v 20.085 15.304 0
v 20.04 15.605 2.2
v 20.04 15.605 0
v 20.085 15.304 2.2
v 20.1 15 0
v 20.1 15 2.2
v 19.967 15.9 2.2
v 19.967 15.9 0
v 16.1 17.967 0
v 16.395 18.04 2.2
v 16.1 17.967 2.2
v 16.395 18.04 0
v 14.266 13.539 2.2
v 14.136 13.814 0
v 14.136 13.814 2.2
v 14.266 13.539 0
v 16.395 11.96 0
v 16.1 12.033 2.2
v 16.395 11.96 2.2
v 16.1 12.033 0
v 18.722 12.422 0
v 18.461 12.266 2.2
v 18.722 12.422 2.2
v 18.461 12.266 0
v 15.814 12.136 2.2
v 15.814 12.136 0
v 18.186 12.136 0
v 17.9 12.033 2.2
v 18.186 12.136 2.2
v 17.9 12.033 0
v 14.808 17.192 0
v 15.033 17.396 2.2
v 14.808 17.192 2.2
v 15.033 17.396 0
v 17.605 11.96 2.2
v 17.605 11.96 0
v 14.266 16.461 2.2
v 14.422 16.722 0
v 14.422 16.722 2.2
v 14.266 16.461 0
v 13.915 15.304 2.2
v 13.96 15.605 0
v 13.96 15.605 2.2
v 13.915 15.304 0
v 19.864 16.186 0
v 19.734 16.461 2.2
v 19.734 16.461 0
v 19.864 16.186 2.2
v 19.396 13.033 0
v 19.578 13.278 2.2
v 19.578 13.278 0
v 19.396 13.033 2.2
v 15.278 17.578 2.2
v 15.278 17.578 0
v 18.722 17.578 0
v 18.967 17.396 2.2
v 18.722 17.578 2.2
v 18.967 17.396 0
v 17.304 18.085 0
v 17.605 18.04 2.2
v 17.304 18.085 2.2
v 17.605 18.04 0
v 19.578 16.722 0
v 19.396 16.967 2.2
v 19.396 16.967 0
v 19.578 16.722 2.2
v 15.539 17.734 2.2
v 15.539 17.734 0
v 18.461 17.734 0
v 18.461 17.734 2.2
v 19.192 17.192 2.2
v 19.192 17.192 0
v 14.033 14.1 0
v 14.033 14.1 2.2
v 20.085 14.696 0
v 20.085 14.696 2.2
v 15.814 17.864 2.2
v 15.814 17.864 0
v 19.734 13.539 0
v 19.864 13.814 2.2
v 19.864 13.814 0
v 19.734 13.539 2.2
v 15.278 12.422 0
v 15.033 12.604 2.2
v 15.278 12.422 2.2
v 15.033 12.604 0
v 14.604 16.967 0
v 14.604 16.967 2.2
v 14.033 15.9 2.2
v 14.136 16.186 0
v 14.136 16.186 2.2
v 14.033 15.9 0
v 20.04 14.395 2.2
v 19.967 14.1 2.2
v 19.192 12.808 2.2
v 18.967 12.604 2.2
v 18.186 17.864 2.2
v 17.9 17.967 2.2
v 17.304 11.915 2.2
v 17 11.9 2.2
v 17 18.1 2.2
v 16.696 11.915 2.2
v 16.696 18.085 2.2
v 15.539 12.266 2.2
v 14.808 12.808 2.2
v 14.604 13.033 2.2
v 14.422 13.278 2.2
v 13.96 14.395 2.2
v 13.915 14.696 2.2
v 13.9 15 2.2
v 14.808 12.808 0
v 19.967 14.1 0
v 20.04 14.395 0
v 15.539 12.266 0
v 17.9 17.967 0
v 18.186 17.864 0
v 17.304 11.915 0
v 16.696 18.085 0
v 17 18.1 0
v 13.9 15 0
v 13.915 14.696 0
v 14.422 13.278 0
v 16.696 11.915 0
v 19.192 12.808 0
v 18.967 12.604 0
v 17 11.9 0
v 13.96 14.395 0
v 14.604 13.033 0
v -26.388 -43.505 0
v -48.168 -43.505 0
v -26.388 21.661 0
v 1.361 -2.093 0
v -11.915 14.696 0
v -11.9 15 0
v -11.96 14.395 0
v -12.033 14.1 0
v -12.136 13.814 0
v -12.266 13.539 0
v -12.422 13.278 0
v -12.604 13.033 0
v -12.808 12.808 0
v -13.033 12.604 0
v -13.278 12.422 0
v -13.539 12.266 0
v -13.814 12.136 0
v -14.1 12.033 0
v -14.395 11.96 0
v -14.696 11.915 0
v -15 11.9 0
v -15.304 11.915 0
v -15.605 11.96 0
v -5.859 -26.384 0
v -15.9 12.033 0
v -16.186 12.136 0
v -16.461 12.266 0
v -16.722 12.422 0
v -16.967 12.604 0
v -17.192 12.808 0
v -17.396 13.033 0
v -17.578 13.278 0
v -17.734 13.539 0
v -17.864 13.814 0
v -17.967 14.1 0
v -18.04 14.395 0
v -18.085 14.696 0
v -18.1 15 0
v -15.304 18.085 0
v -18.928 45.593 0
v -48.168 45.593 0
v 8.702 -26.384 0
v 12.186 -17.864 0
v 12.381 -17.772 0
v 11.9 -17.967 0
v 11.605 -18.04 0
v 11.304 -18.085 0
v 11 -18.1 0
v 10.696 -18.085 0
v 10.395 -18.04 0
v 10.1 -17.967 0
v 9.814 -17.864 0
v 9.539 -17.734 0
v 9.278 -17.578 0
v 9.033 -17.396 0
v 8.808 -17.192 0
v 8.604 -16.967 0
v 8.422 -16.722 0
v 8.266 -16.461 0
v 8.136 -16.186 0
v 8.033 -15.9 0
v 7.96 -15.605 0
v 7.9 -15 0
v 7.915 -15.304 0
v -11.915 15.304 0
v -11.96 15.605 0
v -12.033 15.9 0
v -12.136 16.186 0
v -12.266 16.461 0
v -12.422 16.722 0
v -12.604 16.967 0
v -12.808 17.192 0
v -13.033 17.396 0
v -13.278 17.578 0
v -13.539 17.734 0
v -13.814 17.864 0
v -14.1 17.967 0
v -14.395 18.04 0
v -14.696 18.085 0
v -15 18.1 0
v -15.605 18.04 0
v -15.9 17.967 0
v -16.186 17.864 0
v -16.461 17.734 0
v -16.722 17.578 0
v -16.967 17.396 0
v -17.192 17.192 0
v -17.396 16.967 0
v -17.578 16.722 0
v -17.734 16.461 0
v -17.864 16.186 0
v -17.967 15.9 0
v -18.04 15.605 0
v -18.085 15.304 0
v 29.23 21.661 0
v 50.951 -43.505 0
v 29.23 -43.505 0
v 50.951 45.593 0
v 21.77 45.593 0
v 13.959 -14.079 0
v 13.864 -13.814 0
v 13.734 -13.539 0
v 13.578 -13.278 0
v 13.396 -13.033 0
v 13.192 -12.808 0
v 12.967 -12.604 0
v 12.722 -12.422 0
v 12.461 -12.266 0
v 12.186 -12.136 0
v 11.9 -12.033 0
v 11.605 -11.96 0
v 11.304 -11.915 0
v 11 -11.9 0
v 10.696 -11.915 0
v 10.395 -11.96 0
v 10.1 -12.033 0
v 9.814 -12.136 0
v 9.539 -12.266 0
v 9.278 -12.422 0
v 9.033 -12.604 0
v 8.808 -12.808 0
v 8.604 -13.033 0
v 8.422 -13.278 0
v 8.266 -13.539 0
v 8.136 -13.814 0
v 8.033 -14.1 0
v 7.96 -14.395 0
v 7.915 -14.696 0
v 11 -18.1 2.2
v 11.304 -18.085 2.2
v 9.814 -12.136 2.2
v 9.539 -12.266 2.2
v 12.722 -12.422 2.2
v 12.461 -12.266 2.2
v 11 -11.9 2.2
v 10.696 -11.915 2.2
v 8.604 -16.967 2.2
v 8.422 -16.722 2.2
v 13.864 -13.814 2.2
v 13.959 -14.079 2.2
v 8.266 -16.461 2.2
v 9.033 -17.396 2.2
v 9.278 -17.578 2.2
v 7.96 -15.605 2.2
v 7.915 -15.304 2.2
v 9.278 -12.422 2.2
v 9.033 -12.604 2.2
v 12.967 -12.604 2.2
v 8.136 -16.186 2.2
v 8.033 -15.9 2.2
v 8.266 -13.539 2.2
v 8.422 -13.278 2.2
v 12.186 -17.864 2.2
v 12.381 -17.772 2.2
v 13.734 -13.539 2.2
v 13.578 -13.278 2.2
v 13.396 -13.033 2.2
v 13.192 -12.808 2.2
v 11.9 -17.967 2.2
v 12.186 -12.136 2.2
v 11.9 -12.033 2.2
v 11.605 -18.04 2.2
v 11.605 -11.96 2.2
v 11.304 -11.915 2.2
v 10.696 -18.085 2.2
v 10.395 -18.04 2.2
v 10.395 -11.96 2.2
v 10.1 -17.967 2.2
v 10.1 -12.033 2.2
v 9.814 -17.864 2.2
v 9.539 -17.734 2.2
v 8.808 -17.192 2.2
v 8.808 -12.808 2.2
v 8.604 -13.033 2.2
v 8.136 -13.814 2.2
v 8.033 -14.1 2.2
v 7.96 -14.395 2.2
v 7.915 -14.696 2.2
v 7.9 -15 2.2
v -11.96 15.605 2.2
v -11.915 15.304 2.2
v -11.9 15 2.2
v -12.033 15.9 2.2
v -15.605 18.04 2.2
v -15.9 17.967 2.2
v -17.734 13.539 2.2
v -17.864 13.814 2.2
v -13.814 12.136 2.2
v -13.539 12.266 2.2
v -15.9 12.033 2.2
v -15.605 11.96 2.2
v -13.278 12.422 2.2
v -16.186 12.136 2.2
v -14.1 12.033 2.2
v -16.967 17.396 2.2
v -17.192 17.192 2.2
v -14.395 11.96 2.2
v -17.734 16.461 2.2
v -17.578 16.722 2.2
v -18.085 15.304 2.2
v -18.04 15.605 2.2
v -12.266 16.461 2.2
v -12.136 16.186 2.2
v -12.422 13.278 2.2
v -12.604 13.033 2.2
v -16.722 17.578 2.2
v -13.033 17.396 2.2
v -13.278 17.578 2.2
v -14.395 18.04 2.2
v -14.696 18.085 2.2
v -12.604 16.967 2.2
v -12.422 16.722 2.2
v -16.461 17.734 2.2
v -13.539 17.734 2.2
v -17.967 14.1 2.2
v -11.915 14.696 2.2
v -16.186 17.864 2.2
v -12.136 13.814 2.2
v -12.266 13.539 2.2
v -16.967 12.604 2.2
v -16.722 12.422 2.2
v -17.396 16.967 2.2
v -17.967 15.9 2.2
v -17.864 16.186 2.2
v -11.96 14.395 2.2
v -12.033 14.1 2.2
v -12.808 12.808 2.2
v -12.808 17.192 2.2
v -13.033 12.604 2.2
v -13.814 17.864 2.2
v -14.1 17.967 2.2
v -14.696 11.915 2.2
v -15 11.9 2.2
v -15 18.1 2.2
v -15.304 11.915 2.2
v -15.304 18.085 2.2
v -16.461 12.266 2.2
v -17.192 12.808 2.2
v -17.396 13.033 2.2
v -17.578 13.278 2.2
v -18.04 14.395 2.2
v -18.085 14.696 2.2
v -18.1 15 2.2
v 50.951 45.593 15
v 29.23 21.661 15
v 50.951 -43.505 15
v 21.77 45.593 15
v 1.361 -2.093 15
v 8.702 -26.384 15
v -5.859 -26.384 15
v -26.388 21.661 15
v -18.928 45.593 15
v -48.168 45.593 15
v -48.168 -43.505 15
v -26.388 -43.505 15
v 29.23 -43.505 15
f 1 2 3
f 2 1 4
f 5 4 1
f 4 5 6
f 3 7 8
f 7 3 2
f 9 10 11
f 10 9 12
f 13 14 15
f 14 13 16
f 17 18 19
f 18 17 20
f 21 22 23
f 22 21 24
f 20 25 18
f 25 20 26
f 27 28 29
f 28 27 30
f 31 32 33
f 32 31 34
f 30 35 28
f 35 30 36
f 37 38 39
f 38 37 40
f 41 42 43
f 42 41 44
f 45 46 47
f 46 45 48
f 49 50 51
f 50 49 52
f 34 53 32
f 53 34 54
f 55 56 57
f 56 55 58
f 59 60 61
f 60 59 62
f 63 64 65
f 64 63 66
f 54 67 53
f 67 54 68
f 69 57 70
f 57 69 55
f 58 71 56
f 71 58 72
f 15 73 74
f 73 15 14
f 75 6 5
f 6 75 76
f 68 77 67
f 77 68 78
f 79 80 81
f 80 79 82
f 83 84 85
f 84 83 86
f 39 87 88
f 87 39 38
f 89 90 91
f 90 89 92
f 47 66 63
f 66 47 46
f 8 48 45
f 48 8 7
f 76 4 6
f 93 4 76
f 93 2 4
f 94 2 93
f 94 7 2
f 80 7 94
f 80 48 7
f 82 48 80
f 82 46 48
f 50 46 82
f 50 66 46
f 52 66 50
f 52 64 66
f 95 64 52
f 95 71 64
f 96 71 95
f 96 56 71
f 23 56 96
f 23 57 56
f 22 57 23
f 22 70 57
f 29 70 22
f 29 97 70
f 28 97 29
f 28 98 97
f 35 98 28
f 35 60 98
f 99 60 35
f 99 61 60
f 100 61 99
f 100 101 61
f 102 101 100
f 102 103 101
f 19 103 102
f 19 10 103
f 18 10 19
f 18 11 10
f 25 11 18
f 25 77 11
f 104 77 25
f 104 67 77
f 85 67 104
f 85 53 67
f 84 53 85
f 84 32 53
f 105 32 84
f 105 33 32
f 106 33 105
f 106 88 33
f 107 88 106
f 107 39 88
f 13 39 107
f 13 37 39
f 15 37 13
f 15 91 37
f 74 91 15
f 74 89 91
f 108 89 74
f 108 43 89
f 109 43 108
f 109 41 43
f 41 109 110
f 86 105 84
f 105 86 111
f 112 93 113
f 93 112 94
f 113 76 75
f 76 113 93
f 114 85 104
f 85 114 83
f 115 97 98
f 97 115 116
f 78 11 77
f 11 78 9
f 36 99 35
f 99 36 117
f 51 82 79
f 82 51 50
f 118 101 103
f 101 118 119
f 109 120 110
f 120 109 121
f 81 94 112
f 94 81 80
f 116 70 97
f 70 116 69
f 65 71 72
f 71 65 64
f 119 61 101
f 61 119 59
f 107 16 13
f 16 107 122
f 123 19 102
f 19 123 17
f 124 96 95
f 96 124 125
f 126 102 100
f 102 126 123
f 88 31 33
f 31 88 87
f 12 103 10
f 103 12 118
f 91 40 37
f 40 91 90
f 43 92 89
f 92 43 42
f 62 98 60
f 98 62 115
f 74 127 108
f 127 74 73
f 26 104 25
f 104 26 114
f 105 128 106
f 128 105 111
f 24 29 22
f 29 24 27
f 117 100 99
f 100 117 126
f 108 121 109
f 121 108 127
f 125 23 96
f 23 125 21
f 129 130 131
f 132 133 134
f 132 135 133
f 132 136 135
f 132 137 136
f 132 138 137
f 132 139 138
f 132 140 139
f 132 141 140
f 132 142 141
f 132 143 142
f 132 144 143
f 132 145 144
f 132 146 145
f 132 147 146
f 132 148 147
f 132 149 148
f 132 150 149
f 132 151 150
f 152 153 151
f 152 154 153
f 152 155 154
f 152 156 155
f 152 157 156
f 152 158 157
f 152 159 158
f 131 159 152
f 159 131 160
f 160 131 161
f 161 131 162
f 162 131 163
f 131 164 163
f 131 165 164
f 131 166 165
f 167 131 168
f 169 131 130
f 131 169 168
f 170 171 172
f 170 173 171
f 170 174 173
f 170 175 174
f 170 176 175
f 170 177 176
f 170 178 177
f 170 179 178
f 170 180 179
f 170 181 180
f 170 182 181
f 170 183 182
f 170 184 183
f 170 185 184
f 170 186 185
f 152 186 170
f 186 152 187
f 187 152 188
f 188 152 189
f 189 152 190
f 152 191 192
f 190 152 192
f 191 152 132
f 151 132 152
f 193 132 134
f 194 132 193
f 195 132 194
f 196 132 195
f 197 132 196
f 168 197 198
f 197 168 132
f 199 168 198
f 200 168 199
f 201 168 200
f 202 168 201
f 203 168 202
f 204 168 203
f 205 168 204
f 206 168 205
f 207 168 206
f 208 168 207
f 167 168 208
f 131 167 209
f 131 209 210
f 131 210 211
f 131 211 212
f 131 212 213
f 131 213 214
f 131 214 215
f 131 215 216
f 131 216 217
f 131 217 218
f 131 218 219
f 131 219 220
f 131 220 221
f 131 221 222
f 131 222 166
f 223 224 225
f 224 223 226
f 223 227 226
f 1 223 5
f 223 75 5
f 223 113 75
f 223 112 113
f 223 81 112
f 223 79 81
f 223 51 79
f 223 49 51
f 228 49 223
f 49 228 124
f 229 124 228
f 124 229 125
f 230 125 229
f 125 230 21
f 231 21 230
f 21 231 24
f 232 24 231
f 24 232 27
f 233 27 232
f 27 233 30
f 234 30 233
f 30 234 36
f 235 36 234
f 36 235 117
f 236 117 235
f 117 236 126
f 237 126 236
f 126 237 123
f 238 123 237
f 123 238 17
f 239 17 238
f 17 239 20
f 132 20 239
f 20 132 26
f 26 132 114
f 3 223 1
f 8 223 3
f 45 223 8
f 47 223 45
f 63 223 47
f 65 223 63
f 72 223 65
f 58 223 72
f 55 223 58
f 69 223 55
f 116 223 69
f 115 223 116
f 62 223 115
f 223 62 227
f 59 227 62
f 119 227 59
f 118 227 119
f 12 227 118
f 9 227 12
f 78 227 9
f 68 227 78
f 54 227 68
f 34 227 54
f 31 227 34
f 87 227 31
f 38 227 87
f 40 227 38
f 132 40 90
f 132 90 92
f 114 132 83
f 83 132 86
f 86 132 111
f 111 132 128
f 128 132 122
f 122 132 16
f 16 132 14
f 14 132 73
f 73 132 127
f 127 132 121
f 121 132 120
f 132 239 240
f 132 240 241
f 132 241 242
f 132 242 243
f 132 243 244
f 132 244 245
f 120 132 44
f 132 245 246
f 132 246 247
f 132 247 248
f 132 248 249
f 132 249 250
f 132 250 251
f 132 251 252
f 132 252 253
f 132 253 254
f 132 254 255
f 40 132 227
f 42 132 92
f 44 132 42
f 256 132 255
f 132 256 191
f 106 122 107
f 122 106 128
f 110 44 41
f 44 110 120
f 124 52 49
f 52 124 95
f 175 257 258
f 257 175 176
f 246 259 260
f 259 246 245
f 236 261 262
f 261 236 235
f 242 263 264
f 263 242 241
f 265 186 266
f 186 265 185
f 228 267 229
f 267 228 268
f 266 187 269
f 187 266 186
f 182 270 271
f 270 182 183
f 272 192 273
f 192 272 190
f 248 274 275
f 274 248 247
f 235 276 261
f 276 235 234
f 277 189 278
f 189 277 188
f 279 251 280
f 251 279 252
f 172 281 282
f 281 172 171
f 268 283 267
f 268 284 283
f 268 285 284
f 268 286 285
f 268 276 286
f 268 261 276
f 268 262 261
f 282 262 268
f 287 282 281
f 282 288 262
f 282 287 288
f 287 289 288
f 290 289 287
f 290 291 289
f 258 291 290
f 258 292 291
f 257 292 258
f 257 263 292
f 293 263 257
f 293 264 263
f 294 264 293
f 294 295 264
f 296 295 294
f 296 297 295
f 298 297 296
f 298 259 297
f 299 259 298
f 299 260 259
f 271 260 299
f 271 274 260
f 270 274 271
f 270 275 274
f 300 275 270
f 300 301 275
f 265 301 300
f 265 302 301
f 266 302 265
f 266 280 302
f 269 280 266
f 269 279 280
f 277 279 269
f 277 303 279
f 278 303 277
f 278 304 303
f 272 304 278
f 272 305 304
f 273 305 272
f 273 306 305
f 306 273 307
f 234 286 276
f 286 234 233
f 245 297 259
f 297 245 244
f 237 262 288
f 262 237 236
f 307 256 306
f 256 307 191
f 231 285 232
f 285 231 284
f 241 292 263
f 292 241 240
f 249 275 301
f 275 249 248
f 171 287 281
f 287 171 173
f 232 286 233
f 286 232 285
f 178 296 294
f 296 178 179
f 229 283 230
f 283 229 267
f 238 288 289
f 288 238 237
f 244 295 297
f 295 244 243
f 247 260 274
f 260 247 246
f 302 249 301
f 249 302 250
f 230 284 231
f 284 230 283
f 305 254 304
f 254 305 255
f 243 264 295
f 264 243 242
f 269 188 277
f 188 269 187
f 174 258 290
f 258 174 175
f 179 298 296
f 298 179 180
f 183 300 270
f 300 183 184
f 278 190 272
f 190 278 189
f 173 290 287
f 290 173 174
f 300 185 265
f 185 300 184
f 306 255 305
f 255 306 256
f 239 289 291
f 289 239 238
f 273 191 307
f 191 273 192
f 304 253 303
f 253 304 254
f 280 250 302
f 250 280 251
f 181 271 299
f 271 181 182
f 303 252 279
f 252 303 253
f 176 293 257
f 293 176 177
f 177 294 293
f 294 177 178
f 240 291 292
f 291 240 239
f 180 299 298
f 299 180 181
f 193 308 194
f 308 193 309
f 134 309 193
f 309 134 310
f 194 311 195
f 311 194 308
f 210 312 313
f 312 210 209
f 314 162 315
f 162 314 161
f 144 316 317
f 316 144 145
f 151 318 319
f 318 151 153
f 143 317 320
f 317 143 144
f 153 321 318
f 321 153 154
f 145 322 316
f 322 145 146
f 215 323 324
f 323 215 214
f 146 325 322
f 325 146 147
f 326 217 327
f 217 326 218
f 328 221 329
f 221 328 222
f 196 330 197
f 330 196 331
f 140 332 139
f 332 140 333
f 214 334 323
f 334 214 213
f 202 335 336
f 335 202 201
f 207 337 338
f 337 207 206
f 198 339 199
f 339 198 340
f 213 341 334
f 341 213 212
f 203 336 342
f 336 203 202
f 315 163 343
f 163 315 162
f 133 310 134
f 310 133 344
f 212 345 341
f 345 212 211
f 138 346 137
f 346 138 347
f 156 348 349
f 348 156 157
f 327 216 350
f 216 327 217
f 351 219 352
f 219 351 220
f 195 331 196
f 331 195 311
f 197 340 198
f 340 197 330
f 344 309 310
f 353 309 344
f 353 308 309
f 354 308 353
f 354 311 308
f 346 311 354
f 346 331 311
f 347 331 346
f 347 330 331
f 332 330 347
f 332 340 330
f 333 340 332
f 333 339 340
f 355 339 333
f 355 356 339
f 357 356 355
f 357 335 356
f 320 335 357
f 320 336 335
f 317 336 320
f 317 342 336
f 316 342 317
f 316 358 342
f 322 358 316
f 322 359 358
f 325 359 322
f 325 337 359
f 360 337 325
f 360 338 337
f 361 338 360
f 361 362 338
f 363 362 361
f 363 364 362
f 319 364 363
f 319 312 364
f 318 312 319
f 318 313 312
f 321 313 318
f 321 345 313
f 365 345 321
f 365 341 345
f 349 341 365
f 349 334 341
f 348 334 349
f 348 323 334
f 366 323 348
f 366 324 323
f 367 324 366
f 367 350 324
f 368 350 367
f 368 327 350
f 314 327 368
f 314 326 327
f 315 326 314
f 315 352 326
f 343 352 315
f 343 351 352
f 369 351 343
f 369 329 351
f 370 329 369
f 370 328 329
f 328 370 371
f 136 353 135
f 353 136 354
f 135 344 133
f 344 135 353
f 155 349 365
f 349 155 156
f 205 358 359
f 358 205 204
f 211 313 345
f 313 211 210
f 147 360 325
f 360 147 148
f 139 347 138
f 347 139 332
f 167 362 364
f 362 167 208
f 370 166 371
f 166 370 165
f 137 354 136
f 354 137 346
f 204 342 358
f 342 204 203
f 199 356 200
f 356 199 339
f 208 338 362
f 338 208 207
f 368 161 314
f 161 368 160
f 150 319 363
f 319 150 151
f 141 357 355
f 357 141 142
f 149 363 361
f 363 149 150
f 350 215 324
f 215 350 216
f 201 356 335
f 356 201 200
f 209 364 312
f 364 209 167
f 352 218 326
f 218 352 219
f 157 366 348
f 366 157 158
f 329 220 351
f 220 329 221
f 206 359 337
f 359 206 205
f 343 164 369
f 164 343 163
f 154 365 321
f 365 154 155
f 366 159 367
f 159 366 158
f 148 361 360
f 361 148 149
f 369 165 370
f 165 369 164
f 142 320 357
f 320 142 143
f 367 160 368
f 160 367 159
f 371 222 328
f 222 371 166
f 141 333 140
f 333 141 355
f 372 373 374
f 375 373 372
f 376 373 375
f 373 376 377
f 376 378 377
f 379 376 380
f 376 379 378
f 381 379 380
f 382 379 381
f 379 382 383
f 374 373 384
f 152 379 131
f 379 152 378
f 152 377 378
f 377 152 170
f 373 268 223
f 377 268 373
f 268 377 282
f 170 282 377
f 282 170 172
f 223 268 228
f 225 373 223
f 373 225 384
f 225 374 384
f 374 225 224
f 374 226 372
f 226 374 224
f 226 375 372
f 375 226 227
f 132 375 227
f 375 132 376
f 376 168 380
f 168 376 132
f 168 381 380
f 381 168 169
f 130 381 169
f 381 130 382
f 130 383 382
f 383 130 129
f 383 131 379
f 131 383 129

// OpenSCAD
// Fridge magnet letter tile — fits 100×100 mm build plate
// Render one letter:
//   openscad -q -D 'letter="A"' -o A.stl magnetic_letter_only.scad

// ── Letter ───────────────────────────────────────────────────────────────────
letter    = "M";
size      = 88;   // glyph size in mm — 88 fills most of a 100×100 plate
thickness = 15;   // Z height

// ── Font ─────────────────────────────────────────────────────────────────────
// Uncomment one line (or paste any font name from your system):
font_name = "Bahnschrift:style=Bold";  // DIN-style, built into Windows 10/11
// font_name = "Bahnschrift:style=Bold Condensed";
// font_name = "Liberation Sans:style=Bold";
// font_name = "Arial:style=Bold";
// font_name = "Impact";
// font_name = "Courier New:style=Bold";
// font_name = "Comic Sans MS:style=Bold";
// font_name = "Anton";               // Google Font — narrow + punchy
// font_name = "Oswald:style=Bold";   // Google Font — tall + slim

// ── Magnet pockets ───────────────────────────────────────────────────────────
magnet_d     = 6.2;  // pocket diameter (slightly loose for 6 mm magnets)
magnet_depth = 2.2;  // pocket depth

// ── AUTO placement ───────────────────────────────────────────────────────────
// The letter shape is used as a mask: candidates that land in empty space are
// clipped to nothing by an intersection() with the letter body and disappear.
// Candidates spiral outward from [0,0] so the best-centered spots are picked
// first. Capped at auto_max_magnets so you never pay for more than you need.
//
// Workflow:
//   1. Set auto_magnets = true, hit F6, see where pockets land.
//   2. Happy with them? Leave auto on — you're done.
//   3. Want exact control? Copy the printed coords into magnet_positions
//      and set auto_magnets = false.
auto_magnets     = false;
auto_max_magnets = 4;   // max pockets — magnets are expensive!
auto_spacing     = 16;  // mm between spiral ring candidates

// ── MANUAL placement ─────────────────────────────────────────────────────────
// Origin [0,0] = visual centre of the glyph.  Add/remove/move entries freely.
magnet_positions = [
  [ 17,  15],
  [ 11, -15],
  [-15,  15],
];

// ── Internals ────────────────────────────────────────────────────────────────

// Spiral candidates: ring 0 = [0,0], ring 1 = 6 pts, ring 2 = 12 pts, ...
// Enumerating inner rings first means the cap always picks central spots.
function _ring(r, sp) =
  r == 0
    ? [[0, 0]]
    : [for (a = [0 : 360 / (r * 6) : 359.9]) [sp * r * cos(a), sp * r * sin(a)]];

function _spiral(sp, rings) =
  [for (r = [0:rings], pt = _ring(r, sp)) pt];

// Build enough candidates that the cap can always find 4 inside any large letter
_candidates = _spiral(auto_spacing, 4);  // 0+6+12+18+24 = 60 candidates

module letter_body() {
  linear_extrude(height = thickness)
    text(letter, size = size, font = font_name, halign = "center", valign = "center");
}

// Letter-masked pocket cylinders: intersection with letter_body() clips any
// cylinder that misses the strokes to empty — no partial ghost holes anywhere.
module auto_pockets() {
  n = min(auto_max_magnets, len(_candidates));
  intersection() {
    // Mask: only keep geometry that overlaps letter material
    linear_extrude(height = magnet_depth)
      text(letter, size = size, font = font_name, halign = "center", valign = "center");
    // Candidates (spiral, capped)
    union()
      for (i = [0 : n - 1])
        translate([_candidates[i][0], _candidates[i][1], 0])
          cylinder(h = magnet_depth, d = magnet_d, $fn = 64);
  }
}

module manual_pockets() {
  for (pos = magnet_positions)
    translate([pos[0], pos[1], 0])
      cylinder(h = magnet_depth, d = magnet_d, $fn = 64);
}

difference() {
  letter_body();
  if (auto_magnets) auto_pockets();
  else              manual_pockets();
}
